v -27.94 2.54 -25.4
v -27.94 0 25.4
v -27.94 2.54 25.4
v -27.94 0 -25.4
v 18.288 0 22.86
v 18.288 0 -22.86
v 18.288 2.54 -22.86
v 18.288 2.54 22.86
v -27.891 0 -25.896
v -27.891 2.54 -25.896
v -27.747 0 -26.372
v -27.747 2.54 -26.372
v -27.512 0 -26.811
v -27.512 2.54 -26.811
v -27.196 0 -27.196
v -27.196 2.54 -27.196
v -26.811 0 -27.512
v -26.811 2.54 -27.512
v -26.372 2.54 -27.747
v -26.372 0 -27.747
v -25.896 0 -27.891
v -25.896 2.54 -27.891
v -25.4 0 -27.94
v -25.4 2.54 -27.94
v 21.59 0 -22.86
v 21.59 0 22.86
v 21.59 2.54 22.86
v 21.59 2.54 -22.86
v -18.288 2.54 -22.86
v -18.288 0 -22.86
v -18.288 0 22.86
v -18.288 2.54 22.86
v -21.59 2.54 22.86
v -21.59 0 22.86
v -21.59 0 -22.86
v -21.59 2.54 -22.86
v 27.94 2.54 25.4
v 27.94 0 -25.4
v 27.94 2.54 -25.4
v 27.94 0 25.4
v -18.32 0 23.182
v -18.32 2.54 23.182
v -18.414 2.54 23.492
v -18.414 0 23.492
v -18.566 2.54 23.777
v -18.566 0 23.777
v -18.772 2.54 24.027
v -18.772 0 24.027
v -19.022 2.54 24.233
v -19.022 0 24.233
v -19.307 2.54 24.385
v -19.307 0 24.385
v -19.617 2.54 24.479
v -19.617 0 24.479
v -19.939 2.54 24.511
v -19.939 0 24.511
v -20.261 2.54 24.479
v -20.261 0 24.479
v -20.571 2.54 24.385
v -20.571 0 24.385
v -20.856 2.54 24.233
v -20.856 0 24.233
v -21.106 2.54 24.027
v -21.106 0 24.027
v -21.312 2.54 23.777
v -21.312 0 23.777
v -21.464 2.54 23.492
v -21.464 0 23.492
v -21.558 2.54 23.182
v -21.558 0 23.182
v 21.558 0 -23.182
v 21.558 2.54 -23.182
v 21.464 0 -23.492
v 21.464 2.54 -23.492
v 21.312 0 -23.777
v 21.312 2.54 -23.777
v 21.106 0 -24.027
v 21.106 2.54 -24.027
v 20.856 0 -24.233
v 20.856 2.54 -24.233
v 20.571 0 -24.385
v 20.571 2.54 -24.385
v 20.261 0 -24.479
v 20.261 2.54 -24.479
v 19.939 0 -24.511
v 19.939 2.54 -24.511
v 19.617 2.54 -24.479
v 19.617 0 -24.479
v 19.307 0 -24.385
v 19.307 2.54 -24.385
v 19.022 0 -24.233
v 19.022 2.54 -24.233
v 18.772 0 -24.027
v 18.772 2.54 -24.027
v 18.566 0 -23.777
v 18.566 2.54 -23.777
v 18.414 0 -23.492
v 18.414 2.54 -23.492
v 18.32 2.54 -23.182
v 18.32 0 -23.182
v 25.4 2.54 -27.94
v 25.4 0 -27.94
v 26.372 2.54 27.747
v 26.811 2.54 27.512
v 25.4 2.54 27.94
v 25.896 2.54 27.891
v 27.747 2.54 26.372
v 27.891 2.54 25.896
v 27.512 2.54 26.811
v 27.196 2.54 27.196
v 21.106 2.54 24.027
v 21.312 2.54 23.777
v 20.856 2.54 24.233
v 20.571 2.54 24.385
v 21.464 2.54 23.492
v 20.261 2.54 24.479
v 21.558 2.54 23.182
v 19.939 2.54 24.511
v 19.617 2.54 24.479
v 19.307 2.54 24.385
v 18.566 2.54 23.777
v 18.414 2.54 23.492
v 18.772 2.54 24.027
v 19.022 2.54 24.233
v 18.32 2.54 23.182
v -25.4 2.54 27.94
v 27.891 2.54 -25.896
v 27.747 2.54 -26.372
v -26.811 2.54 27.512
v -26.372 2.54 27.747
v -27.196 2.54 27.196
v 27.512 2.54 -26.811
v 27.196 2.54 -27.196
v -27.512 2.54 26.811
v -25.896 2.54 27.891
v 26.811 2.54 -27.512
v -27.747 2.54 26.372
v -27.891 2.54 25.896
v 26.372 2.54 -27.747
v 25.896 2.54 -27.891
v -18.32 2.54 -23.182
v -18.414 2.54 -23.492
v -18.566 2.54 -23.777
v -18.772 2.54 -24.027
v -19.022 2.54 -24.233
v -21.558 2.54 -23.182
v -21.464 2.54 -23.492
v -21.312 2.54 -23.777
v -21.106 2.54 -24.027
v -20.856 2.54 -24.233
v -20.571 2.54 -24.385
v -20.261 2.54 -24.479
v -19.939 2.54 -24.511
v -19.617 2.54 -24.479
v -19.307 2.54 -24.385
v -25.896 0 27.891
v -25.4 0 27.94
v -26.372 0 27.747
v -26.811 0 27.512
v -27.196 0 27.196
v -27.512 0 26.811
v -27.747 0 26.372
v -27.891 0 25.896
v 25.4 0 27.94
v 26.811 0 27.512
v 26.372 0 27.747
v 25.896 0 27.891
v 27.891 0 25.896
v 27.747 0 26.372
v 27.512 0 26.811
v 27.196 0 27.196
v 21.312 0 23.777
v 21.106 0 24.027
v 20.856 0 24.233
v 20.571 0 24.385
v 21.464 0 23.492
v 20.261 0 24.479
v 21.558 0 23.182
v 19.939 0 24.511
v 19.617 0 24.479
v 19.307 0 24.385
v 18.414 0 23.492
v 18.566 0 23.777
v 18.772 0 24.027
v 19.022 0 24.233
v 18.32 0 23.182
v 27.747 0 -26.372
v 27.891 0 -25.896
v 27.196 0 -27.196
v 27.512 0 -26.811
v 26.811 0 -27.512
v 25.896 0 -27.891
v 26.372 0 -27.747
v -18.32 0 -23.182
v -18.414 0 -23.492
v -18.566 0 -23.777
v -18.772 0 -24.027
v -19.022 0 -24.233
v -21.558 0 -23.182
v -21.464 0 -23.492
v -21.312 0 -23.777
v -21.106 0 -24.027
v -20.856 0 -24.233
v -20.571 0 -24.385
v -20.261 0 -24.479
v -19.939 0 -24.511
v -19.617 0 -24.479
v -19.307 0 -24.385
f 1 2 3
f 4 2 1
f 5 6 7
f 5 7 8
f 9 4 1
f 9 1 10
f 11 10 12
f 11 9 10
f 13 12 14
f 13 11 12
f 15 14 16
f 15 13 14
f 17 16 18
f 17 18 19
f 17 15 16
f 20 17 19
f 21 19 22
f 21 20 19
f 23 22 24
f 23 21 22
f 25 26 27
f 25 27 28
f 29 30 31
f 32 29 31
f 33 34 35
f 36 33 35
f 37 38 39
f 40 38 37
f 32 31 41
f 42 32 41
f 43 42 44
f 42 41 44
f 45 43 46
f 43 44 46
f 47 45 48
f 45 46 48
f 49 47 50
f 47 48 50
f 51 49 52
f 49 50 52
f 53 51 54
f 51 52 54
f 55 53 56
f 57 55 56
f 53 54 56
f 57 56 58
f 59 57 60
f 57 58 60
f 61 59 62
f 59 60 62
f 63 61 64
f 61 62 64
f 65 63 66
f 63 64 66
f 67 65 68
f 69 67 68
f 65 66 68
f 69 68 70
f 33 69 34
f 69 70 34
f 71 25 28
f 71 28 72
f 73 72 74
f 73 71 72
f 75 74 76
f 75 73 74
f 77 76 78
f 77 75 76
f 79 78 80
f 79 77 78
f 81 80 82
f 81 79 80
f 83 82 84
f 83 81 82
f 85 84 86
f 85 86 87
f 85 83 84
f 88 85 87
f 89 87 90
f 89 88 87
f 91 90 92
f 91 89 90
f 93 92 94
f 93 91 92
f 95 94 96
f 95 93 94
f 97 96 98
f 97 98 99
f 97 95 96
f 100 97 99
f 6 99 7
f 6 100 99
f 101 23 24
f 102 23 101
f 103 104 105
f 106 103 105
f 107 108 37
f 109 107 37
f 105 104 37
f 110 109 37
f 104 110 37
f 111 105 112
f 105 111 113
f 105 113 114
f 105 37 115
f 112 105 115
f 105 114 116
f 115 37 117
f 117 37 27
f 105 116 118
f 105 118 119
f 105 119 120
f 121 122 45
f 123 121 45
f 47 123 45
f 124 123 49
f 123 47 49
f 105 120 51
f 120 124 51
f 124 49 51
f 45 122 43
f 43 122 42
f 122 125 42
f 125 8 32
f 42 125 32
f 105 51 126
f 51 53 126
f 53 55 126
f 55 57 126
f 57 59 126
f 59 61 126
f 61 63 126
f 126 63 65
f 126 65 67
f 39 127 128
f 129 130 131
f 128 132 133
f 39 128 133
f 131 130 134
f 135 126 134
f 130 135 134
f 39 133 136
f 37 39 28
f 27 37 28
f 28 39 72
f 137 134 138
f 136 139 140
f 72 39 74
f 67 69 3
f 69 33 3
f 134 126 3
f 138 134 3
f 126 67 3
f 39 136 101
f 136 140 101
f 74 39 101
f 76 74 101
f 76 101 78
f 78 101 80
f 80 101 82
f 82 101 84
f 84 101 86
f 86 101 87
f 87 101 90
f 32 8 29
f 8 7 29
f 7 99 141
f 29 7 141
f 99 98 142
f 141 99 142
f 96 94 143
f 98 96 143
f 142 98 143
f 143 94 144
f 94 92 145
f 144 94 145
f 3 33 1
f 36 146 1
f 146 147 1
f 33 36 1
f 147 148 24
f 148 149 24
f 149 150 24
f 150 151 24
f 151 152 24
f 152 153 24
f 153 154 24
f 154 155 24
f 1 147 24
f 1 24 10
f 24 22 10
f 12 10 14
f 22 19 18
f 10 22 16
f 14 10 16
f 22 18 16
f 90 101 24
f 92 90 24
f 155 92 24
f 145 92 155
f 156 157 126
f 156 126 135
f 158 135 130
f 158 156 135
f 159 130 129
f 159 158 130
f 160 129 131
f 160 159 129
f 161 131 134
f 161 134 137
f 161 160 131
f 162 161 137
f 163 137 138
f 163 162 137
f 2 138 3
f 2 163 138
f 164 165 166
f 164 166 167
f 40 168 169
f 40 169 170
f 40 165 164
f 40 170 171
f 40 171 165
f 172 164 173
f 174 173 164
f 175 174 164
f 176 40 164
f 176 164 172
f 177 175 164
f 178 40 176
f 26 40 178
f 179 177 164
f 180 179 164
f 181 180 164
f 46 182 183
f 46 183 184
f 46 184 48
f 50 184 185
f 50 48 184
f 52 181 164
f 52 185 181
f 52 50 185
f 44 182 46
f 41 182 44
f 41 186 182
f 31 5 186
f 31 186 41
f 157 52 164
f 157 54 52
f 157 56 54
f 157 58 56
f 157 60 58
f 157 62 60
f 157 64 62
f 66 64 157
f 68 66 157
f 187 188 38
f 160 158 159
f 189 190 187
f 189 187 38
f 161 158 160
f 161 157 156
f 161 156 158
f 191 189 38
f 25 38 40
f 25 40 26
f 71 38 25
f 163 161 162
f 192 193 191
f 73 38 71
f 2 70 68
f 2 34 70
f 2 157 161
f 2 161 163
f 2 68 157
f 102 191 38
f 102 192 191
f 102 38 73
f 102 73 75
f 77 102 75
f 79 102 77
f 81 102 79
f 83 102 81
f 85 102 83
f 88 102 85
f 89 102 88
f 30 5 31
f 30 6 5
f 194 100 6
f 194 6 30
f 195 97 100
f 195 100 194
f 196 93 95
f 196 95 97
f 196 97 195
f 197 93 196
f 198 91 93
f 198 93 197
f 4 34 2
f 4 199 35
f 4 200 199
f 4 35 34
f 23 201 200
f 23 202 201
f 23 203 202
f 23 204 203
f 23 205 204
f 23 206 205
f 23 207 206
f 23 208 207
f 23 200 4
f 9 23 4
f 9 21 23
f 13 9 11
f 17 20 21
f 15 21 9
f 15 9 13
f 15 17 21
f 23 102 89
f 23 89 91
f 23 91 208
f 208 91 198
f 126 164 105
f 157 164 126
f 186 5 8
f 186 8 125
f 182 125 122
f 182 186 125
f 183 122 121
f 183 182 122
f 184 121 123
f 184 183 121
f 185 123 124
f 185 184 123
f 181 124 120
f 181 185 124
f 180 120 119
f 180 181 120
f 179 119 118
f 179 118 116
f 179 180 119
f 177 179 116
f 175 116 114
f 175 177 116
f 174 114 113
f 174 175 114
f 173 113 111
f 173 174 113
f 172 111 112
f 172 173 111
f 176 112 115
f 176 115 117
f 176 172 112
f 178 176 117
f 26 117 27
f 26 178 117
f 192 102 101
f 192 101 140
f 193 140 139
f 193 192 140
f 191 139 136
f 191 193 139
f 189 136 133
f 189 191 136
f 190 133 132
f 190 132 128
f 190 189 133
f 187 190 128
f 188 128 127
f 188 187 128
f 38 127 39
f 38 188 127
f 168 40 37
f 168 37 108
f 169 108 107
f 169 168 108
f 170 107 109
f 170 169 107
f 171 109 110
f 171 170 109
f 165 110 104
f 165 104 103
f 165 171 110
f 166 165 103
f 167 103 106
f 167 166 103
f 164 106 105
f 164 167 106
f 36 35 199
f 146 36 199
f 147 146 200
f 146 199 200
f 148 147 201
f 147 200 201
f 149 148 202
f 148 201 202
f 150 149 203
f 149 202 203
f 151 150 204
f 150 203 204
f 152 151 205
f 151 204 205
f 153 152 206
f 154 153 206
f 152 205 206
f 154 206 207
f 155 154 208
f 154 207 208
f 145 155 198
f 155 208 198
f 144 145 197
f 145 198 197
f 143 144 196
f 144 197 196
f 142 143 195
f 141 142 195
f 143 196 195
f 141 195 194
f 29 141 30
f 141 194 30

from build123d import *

# Parameters (mm, degrees)
BOSS_EXTRUDE1_DEPTH = 2.54


with BuildPart() as part:
    # Sketch1 → Boss-Extrude1 (new body)
    with BuildSketch(Plane(origin=(0, 0, 0), x_dir=(1, 0, 0), z_dir=(0, 1, 0))):
        with BuildLine():
            Line((-27.94, 0), (-27.94, 25.4))
            ThreePointArc((-27.94, 25.4), (-27.196051224, 27.196051224), (-25.4, 27.94))
            Line((-25.4, 27.94), (0, 27.94))
            Line((0, 27.94), (25.4, 27.94))
            ThreePointArc((25.4, 27.94), (27.196051224, 27.196051224), (27.94, 25.4))
            Line((27.94, 25.4), (27.94, 0))
            Line((27.94, 0), (27.94, -25.4))
            ThreePointArc((27.94, -25.4), (27.196051224, -27.196051224), (25.4, -27.94))
            Line((25.4, -27.94), (0, -27.94))
            Line((0, -27.94), (-25.4, -27.94))
            ThreePointArc((-25.4, -27.94), (-27.196051224, -27.196051224), (-27.94, -25.4))
            Line((-27.94, -25.4), (-27.94, 0))
        make_face()
        with BuildLine():
            Line((-18.288, 22.86), (-18.288, -22.86))
            ThreePointArc((-18.288, -22.86), (-19.939, -24.511), (-21.59, -22.86))
            Line((-21.59, -22.86), (-21.59, 22.86))
            ThreePointArc((-21.59, 22.86), (-19.939, 24.511), (-18.288, 22.86))
        make_face(mode=Mode.SUBTRACT)
        with BuildLine():
            Line((18.288, 22.86), (18.288, -22.86))
            ThreePointArc((18.288, -22.86), (19.939, -24.511), (21.59, -22.86))
            Line((21.59, -22.86), (21.59, 22.86))
            ThreePointArc((21.59, 22.86), (19.939, 24.511), (18.288, 22.86))
        make_face(mode=Mode.SUBTRACT)
    extrude(amount=BOSS_EXTRUDE1_DEPTH)


solid = part.part
